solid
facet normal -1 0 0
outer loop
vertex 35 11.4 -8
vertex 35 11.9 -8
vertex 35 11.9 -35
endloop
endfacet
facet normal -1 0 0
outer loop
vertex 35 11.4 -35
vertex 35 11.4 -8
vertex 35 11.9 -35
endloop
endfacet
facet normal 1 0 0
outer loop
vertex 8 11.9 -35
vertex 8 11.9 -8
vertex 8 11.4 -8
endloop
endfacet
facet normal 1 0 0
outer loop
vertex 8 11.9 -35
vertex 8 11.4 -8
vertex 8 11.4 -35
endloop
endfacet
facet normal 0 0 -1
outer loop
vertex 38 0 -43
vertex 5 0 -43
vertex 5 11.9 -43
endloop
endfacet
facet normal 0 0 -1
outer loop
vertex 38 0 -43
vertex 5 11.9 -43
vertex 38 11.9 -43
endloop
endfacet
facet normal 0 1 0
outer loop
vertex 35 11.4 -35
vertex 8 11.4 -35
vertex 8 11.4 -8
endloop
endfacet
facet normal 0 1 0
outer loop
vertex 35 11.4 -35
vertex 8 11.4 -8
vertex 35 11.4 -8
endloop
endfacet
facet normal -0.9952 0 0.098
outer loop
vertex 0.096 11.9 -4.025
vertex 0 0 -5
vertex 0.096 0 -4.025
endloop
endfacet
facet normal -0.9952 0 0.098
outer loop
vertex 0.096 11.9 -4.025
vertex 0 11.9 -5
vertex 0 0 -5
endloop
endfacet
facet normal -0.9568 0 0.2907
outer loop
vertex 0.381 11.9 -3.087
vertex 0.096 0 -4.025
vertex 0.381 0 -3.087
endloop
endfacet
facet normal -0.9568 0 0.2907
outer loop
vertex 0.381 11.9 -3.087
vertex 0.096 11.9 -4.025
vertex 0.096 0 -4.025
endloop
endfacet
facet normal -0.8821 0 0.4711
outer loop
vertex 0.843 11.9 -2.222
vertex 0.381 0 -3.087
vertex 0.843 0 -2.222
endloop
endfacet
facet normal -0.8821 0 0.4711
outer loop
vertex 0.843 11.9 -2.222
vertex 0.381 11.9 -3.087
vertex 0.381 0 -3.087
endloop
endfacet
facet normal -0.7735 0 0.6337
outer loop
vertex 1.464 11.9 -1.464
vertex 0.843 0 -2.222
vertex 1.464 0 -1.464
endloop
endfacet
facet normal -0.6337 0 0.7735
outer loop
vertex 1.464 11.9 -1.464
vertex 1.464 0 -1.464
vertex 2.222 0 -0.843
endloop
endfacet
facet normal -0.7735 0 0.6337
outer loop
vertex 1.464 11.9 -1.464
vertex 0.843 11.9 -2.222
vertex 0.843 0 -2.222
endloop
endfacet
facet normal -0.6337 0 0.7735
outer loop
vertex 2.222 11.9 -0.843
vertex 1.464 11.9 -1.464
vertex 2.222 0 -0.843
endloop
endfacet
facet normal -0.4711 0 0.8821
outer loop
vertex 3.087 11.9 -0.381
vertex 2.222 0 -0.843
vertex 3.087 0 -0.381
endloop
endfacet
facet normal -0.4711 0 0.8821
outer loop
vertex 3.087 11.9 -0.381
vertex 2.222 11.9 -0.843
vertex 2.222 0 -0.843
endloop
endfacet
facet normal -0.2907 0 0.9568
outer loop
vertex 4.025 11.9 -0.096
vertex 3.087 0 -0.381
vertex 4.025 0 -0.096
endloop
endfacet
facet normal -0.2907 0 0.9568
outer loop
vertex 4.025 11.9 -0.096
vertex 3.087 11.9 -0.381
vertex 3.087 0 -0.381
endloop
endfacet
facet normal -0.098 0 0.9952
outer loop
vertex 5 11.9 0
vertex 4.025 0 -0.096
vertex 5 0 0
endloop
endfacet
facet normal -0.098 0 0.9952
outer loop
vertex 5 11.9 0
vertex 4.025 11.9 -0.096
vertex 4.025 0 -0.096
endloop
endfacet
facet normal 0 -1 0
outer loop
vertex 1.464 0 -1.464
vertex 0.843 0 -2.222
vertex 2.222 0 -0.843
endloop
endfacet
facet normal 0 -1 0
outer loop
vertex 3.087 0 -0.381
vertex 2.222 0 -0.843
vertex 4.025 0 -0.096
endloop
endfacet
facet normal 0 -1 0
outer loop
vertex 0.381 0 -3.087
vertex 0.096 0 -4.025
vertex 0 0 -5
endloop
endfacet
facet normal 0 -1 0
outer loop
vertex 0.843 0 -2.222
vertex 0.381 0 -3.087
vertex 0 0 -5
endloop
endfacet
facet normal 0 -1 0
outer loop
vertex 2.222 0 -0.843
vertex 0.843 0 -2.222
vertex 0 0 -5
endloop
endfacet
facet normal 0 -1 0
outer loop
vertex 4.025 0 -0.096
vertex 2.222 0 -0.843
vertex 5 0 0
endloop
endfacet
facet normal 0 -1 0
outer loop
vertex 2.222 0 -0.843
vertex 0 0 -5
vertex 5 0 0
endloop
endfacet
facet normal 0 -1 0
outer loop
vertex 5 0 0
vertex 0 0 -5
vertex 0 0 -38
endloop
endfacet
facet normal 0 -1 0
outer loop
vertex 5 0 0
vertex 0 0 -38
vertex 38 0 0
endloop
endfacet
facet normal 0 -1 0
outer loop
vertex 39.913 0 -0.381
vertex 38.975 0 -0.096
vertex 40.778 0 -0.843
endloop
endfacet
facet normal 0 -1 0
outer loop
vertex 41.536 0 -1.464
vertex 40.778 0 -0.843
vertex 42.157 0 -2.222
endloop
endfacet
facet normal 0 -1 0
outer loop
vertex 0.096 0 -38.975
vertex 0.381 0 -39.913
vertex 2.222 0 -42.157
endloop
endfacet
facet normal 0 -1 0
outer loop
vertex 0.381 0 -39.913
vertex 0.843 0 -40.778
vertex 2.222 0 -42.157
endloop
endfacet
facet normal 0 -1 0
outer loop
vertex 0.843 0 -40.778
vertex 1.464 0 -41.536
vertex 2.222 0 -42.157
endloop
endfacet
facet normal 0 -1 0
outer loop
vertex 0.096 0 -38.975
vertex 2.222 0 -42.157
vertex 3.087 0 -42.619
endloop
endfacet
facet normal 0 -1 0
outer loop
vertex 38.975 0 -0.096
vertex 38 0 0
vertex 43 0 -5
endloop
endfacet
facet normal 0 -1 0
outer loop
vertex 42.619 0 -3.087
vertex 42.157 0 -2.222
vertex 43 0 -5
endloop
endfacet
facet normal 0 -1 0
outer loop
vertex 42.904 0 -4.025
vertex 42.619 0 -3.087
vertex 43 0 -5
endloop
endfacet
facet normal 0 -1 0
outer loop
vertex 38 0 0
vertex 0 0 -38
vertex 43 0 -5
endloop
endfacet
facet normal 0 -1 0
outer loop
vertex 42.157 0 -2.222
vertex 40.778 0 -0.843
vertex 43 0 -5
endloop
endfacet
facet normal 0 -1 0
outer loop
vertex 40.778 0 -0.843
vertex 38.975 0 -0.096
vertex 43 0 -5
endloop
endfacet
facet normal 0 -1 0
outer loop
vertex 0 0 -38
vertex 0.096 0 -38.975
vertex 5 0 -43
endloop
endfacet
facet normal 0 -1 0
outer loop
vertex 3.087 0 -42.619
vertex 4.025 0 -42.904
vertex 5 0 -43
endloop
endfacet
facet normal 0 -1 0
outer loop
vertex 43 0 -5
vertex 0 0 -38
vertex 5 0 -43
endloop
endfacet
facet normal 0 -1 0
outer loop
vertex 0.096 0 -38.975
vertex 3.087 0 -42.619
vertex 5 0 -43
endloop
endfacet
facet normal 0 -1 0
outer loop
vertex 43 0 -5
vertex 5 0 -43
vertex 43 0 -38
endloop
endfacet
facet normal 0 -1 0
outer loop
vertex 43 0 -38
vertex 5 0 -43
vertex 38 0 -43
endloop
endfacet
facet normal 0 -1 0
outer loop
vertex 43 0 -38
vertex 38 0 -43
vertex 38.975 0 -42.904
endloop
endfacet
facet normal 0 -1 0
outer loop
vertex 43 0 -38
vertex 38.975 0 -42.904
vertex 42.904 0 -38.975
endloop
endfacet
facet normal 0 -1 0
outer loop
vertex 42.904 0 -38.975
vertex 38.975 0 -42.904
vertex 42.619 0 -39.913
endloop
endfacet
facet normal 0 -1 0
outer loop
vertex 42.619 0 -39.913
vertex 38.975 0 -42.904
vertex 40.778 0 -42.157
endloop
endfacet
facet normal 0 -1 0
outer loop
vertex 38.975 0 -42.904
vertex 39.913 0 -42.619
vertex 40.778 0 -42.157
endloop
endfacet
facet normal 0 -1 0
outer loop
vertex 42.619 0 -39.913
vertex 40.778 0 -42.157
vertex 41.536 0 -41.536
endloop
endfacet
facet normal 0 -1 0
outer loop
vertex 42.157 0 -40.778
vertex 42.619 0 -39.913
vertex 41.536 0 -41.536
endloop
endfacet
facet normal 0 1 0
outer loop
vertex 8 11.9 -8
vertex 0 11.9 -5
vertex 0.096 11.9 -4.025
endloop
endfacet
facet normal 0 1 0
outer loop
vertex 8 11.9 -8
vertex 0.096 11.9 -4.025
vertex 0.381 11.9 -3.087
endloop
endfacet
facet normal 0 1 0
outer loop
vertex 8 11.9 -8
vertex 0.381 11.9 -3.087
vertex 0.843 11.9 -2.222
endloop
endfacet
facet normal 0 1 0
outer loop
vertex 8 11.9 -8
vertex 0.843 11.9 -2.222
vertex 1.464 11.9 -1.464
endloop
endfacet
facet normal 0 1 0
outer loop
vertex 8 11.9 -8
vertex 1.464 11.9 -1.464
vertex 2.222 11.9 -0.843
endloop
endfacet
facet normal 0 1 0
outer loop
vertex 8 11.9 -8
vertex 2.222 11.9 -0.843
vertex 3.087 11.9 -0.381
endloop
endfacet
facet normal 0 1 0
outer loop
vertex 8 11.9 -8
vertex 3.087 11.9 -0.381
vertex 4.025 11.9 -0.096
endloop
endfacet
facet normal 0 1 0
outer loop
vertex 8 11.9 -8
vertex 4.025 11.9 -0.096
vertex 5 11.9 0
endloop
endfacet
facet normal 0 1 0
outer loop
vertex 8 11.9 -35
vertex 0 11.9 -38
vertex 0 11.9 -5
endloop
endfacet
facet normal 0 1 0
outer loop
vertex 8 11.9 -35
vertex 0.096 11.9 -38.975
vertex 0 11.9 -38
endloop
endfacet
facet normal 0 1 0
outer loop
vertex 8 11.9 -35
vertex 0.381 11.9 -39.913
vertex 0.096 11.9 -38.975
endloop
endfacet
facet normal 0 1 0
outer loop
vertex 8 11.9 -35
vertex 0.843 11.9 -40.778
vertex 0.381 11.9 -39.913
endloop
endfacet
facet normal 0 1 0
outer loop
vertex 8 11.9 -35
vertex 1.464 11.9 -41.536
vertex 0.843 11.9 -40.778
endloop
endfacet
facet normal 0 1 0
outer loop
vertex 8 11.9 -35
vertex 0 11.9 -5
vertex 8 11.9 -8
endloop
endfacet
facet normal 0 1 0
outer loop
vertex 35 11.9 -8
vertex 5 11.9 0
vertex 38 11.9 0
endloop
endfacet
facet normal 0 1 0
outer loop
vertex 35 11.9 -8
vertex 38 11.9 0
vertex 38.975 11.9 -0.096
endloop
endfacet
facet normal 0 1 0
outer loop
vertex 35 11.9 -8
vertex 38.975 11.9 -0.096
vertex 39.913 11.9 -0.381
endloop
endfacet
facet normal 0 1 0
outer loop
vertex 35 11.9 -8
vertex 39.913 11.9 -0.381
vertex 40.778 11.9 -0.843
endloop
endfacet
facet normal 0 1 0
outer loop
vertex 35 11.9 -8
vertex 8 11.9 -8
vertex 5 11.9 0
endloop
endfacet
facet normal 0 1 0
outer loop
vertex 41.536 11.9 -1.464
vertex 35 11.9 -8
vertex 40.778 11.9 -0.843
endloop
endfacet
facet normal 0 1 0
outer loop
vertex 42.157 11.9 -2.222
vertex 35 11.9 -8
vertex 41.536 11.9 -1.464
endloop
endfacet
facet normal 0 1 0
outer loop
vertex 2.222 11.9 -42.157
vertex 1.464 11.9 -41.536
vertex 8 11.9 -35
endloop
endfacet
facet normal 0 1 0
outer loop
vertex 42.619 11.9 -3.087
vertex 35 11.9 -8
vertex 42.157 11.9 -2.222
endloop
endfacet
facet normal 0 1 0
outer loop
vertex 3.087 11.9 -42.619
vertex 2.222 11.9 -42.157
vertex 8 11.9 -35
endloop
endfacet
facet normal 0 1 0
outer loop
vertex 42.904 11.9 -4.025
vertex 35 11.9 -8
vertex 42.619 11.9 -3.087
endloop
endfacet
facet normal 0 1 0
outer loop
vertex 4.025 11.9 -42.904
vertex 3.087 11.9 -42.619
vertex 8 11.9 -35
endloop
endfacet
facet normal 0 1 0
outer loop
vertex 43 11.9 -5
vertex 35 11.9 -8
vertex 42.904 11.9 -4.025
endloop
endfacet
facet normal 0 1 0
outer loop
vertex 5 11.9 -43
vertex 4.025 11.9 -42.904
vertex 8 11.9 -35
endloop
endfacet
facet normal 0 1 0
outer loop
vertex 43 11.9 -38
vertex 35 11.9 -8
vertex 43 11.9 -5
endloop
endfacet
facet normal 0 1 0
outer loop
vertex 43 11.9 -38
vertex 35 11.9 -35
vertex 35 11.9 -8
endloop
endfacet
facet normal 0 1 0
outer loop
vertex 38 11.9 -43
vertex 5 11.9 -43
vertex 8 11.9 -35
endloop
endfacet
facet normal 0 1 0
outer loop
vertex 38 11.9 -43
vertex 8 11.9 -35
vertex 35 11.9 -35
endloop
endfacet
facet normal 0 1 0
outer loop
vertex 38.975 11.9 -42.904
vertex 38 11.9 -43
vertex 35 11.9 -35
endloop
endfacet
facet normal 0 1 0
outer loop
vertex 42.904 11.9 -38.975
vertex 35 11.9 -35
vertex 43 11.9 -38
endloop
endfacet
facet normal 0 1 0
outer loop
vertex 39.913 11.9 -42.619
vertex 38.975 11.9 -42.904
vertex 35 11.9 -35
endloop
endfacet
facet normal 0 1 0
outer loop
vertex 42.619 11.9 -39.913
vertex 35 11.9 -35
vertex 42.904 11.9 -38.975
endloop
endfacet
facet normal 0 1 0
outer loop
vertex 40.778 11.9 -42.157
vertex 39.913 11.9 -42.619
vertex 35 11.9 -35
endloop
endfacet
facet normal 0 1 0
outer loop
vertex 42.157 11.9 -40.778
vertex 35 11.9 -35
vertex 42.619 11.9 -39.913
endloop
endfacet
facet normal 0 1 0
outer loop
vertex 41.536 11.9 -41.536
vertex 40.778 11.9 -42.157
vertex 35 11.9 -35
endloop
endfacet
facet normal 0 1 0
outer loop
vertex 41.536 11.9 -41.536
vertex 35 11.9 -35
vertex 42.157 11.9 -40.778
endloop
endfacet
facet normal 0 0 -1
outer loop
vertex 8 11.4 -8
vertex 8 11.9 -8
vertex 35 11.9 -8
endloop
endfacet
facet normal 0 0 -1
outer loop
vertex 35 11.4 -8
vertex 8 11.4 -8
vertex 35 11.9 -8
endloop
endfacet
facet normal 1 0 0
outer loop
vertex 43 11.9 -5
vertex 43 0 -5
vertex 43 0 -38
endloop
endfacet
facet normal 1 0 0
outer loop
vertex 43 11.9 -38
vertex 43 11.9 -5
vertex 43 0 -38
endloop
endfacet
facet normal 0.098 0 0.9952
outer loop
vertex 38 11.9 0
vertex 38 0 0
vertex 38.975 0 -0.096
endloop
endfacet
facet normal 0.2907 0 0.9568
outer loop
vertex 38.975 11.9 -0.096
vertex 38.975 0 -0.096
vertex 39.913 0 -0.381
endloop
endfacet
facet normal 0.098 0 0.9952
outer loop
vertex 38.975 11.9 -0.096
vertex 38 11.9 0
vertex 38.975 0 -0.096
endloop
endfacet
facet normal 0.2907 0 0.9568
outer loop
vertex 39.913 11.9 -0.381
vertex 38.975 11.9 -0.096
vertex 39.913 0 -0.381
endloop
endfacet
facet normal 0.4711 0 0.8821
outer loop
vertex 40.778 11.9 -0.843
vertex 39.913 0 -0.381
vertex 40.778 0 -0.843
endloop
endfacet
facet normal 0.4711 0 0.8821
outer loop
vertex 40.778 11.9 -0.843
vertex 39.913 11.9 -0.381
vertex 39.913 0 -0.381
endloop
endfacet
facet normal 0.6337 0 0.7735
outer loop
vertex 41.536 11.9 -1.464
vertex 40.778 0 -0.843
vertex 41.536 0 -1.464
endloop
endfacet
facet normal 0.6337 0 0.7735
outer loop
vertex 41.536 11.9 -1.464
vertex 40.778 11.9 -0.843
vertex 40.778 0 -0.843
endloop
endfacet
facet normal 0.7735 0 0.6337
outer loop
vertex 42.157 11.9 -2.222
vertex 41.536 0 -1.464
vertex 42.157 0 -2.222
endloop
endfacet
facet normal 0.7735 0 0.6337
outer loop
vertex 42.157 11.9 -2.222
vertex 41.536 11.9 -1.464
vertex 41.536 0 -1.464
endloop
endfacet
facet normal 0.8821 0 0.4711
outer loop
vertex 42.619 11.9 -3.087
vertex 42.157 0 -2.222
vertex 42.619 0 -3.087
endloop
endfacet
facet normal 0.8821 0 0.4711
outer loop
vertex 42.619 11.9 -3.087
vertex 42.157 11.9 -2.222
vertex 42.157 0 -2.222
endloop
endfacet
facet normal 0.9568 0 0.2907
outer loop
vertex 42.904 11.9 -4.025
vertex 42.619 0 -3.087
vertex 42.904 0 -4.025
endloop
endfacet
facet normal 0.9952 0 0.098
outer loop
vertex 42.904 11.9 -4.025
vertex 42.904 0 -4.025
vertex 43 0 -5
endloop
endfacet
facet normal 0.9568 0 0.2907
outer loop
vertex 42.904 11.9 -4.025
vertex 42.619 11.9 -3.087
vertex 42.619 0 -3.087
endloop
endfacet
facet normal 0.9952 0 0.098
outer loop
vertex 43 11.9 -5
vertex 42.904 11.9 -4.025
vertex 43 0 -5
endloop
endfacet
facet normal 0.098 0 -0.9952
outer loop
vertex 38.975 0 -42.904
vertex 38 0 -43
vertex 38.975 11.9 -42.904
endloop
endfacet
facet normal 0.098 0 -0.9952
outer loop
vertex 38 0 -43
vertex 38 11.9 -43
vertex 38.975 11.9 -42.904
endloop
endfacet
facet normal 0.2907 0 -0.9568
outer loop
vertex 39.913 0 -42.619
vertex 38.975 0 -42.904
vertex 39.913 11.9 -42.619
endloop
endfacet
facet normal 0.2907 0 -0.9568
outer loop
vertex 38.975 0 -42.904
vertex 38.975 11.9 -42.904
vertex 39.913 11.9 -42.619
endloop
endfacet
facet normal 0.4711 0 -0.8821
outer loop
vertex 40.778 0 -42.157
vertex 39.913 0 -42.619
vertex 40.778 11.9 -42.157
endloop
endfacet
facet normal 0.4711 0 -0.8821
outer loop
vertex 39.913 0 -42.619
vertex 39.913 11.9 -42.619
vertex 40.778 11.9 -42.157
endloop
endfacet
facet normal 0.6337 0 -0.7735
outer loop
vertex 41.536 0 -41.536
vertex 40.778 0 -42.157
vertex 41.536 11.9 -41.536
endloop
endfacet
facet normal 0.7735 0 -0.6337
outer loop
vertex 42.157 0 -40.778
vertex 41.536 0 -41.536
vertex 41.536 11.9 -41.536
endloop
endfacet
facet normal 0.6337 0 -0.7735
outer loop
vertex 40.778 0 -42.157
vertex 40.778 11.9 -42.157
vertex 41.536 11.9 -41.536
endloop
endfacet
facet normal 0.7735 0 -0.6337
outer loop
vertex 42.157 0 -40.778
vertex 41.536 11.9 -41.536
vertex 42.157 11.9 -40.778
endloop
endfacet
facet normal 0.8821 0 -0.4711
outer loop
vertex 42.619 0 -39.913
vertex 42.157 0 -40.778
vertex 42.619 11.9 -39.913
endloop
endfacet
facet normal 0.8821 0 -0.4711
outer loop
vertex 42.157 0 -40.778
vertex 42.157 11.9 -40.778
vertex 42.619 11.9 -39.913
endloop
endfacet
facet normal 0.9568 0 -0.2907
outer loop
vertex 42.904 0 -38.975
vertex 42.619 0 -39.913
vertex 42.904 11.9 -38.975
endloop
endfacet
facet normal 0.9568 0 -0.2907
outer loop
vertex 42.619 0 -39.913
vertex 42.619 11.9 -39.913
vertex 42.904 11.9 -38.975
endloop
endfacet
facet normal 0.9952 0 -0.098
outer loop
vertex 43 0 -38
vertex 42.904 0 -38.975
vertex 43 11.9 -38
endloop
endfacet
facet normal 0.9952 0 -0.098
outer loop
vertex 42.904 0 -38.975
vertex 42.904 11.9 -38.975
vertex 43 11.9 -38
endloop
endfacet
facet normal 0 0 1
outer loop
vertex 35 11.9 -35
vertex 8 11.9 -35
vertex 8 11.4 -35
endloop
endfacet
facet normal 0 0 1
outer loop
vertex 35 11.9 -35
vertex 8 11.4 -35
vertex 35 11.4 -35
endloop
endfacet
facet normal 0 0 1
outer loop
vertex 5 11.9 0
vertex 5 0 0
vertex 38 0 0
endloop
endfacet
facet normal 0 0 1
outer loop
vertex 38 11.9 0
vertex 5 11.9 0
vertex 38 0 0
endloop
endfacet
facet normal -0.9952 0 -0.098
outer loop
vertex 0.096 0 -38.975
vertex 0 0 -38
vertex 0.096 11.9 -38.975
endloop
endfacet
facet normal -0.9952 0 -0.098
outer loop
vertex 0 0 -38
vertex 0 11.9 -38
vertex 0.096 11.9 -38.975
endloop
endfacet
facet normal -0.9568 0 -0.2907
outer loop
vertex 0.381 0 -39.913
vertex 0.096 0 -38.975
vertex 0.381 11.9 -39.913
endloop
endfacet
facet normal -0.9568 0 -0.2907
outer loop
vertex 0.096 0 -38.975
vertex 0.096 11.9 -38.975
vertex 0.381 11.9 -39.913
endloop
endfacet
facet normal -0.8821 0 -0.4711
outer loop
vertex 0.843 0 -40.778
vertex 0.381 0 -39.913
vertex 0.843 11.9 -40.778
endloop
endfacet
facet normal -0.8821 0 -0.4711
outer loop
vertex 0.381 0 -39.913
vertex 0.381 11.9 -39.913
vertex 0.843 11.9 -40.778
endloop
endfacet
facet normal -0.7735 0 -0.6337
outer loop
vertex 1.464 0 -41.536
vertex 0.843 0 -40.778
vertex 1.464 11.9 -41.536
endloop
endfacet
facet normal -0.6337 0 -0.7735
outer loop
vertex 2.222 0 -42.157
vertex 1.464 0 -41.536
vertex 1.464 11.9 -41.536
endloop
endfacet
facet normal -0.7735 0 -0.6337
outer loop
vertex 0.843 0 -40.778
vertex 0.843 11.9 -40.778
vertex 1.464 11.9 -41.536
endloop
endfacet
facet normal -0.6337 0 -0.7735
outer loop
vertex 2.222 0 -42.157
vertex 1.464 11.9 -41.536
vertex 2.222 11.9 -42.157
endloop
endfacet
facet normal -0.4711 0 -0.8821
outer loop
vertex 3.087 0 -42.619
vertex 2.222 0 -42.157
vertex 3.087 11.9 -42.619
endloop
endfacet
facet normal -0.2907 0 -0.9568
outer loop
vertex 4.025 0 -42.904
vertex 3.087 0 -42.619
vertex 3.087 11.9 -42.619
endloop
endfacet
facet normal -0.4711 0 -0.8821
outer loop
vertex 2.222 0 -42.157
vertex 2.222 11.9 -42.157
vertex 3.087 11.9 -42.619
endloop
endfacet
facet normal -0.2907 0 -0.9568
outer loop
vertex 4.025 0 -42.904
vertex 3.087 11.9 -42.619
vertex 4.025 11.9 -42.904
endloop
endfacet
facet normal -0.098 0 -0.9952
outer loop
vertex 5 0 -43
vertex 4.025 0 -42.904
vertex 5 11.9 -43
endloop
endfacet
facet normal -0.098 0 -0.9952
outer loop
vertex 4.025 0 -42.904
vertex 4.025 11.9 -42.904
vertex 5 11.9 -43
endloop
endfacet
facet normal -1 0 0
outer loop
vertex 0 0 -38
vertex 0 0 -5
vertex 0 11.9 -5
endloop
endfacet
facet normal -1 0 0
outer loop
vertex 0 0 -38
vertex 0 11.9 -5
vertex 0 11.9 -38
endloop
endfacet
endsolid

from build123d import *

# Parameters (mm, degrees)
CROQUIS1_W              = 43
CROQUIS1_H              = 43
SALIENTE_EXTRUIR1_DEPTH = 11.9
CROQUIS2_W              = 27
CROQUIS2_H              = 27
CORTAR_EXTRUIR1_DEPTH   = 0.5
REDONDEO1_R             = 5


with BuildPart() as part:
    # Croquis1 → Saliente-Extruir1 (new body)
    with BuildSketch(Plane(origin=(0, 0, 0), x_dir=(1, 0, 0), z_dir=(0, 1, 0))):
        with Locations((21.5, 21.5)):
            Rectangle(CROQUIS1_W, CROQUIS1_H)
    extrude(amount=SALIENTE_EXTRUIR1_DEPTH)

    # Croquis2 → Cortar-Extruir1 (cut)
    with BuildSketch(Plane(origin=(0, 11.9, 0), x_dir=(1, 0, 0), z_dir=(0, 1, 0))):
        with Locations((21.5, 21.5)):
            Rectangle(CROQUIS2_W, CROQUIS2_H)
    extrude(amount=-CORTAR_EXTRUIR1_DEPTH, mode=Mode.SUBTRACT)

    # Redondeo1
    redondeo1_edges = [part.edges().sort_by_distance(p)[0] for p in [
        (0, 5.95, -43),
        (43, 5.95, -43),
        (43, 5.95, 0),
        (0, 5.95, 0),
    ]]
    fillet(redondeo1_edges, radius=REDONDEO1_R)


solid = part.part
